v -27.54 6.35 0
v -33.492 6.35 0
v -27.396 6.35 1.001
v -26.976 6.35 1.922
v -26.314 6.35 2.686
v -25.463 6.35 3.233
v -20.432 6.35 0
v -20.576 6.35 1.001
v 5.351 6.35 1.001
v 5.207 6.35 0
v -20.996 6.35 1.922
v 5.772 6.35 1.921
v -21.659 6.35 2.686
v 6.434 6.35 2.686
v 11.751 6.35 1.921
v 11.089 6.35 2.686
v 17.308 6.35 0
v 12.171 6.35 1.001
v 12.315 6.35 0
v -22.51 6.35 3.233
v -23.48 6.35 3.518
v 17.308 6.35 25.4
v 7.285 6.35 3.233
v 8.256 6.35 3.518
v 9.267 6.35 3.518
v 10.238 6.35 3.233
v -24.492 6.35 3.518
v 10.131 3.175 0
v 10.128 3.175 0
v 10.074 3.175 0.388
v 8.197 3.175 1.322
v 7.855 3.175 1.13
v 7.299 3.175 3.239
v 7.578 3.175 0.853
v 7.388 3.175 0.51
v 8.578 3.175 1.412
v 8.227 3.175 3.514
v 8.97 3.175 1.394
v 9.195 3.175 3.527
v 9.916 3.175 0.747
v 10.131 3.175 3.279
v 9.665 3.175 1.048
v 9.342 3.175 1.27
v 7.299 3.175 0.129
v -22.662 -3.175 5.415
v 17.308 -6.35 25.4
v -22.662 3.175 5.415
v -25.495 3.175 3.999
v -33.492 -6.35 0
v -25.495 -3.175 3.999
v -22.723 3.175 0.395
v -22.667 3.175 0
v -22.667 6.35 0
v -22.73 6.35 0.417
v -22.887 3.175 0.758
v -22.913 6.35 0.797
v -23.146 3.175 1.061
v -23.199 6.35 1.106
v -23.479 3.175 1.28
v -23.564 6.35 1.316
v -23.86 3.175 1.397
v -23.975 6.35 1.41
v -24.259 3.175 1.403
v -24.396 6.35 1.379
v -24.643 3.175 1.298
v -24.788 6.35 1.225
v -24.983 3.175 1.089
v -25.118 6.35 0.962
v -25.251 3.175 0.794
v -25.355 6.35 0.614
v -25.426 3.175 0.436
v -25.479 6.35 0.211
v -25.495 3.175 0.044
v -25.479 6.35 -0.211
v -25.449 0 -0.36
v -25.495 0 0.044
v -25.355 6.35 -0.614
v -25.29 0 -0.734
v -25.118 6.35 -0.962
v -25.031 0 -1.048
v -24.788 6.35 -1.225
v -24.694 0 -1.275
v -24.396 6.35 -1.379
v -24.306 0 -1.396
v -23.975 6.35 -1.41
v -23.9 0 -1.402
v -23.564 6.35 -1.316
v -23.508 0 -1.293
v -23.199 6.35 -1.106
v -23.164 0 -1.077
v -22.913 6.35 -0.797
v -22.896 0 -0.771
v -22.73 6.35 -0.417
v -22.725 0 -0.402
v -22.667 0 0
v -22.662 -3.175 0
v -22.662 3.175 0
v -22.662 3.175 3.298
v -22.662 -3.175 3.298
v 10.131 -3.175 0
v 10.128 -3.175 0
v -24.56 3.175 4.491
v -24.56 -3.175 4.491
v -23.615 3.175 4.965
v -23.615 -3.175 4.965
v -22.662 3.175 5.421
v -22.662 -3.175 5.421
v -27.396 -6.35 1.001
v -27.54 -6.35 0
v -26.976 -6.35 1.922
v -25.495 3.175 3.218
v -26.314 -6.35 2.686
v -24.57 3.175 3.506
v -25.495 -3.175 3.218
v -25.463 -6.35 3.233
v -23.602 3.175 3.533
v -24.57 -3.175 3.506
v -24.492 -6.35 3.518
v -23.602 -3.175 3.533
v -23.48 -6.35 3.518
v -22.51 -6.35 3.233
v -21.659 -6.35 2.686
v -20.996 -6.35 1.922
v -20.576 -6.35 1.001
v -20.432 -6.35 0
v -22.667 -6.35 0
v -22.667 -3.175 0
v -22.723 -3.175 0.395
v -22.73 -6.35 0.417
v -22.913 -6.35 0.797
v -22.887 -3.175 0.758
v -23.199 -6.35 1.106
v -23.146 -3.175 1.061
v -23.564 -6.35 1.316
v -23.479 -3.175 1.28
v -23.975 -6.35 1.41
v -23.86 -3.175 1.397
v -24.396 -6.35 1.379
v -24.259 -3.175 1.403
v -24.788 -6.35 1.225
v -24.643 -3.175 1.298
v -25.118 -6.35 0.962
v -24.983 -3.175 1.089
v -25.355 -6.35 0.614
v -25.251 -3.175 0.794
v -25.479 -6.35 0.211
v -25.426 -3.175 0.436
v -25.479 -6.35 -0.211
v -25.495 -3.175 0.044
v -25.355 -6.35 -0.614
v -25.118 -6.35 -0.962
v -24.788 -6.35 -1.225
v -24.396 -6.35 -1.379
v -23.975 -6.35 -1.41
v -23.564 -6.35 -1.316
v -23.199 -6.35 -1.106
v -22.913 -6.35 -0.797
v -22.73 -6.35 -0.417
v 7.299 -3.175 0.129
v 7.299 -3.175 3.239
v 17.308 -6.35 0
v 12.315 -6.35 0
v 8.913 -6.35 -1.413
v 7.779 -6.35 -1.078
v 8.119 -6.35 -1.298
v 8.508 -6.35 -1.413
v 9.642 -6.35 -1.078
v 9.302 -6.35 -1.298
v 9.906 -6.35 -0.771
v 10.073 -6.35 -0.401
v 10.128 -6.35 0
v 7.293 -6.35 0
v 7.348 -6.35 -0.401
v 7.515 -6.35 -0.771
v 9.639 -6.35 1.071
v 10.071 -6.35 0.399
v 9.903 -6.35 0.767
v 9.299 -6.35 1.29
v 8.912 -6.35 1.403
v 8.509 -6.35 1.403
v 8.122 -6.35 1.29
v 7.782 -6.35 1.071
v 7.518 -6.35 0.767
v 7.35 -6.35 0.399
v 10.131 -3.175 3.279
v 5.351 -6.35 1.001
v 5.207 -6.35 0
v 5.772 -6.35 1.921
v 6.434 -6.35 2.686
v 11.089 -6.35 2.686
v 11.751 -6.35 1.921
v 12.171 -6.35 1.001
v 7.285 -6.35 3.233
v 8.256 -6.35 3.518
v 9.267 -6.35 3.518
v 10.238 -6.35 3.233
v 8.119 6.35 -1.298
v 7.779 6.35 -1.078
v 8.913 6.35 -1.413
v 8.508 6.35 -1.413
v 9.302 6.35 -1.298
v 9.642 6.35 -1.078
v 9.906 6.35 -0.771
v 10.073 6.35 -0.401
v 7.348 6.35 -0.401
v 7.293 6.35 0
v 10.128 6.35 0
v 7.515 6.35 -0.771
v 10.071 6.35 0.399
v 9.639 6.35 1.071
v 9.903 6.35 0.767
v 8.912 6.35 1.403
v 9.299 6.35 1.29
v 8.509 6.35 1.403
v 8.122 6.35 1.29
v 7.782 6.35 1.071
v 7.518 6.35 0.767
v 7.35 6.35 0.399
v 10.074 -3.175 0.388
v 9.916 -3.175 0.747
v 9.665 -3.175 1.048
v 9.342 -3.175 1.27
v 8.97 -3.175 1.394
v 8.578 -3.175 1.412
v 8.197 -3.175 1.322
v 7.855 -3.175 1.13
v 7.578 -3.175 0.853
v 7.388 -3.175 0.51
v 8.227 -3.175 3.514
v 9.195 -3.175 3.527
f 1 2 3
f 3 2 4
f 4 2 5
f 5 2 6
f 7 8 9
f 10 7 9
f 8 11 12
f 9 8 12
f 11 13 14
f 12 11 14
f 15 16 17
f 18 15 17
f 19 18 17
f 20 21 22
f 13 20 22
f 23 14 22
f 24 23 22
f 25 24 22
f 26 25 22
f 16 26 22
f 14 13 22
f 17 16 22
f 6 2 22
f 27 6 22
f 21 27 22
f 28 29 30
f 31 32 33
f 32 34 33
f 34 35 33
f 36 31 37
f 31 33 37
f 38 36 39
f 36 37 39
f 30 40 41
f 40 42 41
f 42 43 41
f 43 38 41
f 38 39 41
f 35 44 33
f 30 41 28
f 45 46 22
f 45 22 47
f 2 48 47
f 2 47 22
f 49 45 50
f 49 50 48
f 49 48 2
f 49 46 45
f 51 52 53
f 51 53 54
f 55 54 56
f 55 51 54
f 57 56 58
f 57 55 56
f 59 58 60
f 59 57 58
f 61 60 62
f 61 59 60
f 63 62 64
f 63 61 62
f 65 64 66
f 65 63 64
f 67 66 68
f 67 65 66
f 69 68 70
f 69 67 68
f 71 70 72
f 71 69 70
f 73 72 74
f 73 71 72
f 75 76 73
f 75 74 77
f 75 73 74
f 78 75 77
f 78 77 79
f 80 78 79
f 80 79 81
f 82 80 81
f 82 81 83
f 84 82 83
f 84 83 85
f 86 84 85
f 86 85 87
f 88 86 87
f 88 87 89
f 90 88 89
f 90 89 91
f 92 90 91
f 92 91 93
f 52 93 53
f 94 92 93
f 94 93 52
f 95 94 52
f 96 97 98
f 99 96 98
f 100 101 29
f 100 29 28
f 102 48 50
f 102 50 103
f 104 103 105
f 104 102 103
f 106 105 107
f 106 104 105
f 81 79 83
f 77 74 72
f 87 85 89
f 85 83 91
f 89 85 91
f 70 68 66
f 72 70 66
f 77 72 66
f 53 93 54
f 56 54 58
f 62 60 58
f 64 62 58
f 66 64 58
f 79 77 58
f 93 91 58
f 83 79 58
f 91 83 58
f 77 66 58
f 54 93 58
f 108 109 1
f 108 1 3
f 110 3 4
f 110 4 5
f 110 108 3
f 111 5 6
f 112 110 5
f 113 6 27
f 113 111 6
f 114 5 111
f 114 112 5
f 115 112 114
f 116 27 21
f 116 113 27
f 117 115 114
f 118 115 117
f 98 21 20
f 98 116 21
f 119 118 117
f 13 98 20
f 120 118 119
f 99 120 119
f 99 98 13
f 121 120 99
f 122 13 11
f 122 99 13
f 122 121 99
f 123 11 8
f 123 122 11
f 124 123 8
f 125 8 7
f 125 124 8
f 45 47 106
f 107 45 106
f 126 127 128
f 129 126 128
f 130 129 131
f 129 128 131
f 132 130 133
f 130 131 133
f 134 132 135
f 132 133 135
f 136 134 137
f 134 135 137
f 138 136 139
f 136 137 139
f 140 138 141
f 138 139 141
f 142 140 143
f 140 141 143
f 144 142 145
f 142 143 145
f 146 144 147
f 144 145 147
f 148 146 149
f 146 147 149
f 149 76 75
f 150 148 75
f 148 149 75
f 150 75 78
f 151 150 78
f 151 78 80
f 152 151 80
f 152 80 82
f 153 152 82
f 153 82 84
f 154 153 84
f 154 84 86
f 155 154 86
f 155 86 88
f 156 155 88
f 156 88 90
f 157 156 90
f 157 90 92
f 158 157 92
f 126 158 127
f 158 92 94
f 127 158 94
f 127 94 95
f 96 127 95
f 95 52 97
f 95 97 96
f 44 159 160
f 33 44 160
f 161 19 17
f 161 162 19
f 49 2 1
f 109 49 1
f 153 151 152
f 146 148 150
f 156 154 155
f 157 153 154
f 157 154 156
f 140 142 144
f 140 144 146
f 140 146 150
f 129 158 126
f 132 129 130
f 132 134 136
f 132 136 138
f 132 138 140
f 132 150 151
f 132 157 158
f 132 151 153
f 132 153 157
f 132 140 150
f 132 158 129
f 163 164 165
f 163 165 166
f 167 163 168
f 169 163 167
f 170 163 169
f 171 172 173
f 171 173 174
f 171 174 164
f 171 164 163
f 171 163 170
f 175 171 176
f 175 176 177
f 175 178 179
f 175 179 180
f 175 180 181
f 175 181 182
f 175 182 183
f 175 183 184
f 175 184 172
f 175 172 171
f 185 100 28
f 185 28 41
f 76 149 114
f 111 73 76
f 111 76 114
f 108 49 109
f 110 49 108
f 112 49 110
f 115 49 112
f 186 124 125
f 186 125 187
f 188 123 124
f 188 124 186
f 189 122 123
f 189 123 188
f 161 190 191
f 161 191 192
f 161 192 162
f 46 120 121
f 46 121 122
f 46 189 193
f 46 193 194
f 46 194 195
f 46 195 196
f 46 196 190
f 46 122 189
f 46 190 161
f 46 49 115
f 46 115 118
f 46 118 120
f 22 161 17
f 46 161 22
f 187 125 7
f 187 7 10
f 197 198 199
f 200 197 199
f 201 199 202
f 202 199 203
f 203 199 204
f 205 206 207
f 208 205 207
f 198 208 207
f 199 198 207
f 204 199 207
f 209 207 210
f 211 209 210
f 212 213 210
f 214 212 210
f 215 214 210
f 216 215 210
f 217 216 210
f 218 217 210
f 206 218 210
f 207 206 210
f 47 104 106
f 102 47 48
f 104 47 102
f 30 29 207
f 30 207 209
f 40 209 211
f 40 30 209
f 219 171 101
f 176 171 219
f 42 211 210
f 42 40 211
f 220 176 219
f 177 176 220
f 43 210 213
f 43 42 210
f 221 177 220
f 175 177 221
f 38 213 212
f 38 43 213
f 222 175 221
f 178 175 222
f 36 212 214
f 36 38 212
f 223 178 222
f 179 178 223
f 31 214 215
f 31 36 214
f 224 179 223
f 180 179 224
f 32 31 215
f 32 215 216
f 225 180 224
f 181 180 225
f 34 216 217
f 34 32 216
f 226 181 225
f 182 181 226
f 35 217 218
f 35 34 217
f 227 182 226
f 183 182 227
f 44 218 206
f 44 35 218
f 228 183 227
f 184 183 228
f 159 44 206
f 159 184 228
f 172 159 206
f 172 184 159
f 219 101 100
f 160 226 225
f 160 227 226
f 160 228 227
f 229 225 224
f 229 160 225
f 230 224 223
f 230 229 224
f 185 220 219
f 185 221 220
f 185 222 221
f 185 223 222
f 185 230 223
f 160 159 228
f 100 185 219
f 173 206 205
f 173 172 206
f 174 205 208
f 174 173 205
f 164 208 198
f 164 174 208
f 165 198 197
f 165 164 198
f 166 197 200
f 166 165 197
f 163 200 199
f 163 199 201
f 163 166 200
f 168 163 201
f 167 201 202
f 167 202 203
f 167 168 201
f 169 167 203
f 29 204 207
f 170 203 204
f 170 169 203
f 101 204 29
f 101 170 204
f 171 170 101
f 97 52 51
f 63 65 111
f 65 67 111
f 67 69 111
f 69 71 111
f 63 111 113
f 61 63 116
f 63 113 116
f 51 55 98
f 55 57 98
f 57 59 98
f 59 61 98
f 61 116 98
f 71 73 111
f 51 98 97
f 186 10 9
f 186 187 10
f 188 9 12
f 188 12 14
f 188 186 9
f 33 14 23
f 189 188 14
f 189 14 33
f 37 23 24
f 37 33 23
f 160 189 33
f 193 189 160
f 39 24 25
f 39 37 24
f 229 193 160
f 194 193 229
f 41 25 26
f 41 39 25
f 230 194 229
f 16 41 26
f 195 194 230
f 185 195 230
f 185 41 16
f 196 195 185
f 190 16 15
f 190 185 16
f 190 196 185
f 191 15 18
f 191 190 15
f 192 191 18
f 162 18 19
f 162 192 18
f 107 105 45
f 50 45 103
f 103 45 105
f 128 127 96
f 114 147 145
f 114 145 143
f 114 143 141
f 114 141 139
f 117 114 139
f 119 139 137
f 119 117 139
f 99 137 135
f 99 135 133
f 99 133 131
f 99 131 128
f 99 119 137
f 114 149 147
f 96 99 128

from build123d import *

# Parameters (mm, degrees)
F1_DEPTH    = 6.35
F2_W        = 2.8327330947
F2_H        = 10.4811154306
F3_DEPTH    = 3.175
F4_T4_DEPTH = 134.7141247892
F6_DEPTH    = 6.35


# Not quite as in the source:
# - a fillet or chamfer that OpenCascade refuses, or shapes differently, is made with other operations: its cross-section is extruded or revolved along the edge and cut away or added
# - a feature names something its author has since deleted; it is built from what else it names


with BuildPart() as f1:
    # F0 (on Front) → F1 (new body, symmetric)
    with BuildSketch(Plane.XZ):
        with BuildLine():
            Line((17.3079642735, 0), (17.3079642735, 25.4))
            Line((17.3079642735, 25.4), (-33.4920357265, 0))
            Line((-33.4920357265, 0), (-27.5403555314, 0))
            ThreePointArc((-27.5403555314, 0), (-23.9862389863, 3.5541165451), (-20.4321224411, 0))
            Line((-20.4321224411, 0), (5.2073936615, 0))
            ThreePointArc((5.2073936615, 0), (8.7613936615, 3.554), (12.3153936615, 0))
            Line((12.3153936615, 0), (17.3079642735, 0))
        make_face()
    extrude(amount=F1_DEPTH, both=True)

    # F2 (on Front) → F3 (join, symmetric)
    with BuildSketch(Plane.XZ):
        with Locations((-24.0782387555, 5.2405577153)):
            Rectangle(F2_W, F2_H)
        with Locations((8.7149282917, 5.2405577153)):
            Rectangle(F2_W, F2_H)
    extrude(amount=F3_DEPTH, both=True)

    # F4: fillet of radius 54.0783837972 on 1 edges, made by hand


with BuildPart() as f4_tool2:
    # F4_s3 → F4_t4 (new body)
    with BuildSketch(Plane.XZ.offset(-67.3570623946)):
        with BuildLine():
            ThreePointArc((-25.4946053028, 3.9987152119), (-13.0610727535, 8.8354764656), (0.178219655, 10.4811154306))
            Line((0.178219655, 10.4811154306), (-25.4946053028, 10.4811154306))
            Line((-25.4946053028, 10.4811154306), (-25.4946053028, 3.9987152119))
        make_face()
    extrude(amount=F4_T4_DEPTH)

    split(bisect_by=Plane.YZ.offset(-22.6618722081), keep=Keep.BOTTOM)


with BuildPart() as f1_1:
    add(f1.part)

    # F4_t1: cut F4_tool2
    add(f4_tool2.part, mode=Mode.SUBTRACT)

    # F5 (on Front) → F6 (join, symmetric)
    with BuildSketch(Plane.XZ):
        with BuildLine():
            ThreePointArc((-25.4952833056, 0), (-24.0811295807, -1.4141537249), (-22.6669758558, 0))
            ThreePointArc((-22.6669758558, 0), (-24.0811295807, 1.4141537249), (-25.4952833056, 0))
        make_face()
        with BuildLine():
            ThreePointArc((7.2927195579, 0), (8.7104998529, -1.4270738296), (10.1282801479, 0))
            ThreePointArc((10.1282801479, 0), (8.7104998529, 1.417780295), (7.2927195579, 0))
        make_face()
    extrude(amount=F6_DEPTH, both=True)


solid = f1_1.part
